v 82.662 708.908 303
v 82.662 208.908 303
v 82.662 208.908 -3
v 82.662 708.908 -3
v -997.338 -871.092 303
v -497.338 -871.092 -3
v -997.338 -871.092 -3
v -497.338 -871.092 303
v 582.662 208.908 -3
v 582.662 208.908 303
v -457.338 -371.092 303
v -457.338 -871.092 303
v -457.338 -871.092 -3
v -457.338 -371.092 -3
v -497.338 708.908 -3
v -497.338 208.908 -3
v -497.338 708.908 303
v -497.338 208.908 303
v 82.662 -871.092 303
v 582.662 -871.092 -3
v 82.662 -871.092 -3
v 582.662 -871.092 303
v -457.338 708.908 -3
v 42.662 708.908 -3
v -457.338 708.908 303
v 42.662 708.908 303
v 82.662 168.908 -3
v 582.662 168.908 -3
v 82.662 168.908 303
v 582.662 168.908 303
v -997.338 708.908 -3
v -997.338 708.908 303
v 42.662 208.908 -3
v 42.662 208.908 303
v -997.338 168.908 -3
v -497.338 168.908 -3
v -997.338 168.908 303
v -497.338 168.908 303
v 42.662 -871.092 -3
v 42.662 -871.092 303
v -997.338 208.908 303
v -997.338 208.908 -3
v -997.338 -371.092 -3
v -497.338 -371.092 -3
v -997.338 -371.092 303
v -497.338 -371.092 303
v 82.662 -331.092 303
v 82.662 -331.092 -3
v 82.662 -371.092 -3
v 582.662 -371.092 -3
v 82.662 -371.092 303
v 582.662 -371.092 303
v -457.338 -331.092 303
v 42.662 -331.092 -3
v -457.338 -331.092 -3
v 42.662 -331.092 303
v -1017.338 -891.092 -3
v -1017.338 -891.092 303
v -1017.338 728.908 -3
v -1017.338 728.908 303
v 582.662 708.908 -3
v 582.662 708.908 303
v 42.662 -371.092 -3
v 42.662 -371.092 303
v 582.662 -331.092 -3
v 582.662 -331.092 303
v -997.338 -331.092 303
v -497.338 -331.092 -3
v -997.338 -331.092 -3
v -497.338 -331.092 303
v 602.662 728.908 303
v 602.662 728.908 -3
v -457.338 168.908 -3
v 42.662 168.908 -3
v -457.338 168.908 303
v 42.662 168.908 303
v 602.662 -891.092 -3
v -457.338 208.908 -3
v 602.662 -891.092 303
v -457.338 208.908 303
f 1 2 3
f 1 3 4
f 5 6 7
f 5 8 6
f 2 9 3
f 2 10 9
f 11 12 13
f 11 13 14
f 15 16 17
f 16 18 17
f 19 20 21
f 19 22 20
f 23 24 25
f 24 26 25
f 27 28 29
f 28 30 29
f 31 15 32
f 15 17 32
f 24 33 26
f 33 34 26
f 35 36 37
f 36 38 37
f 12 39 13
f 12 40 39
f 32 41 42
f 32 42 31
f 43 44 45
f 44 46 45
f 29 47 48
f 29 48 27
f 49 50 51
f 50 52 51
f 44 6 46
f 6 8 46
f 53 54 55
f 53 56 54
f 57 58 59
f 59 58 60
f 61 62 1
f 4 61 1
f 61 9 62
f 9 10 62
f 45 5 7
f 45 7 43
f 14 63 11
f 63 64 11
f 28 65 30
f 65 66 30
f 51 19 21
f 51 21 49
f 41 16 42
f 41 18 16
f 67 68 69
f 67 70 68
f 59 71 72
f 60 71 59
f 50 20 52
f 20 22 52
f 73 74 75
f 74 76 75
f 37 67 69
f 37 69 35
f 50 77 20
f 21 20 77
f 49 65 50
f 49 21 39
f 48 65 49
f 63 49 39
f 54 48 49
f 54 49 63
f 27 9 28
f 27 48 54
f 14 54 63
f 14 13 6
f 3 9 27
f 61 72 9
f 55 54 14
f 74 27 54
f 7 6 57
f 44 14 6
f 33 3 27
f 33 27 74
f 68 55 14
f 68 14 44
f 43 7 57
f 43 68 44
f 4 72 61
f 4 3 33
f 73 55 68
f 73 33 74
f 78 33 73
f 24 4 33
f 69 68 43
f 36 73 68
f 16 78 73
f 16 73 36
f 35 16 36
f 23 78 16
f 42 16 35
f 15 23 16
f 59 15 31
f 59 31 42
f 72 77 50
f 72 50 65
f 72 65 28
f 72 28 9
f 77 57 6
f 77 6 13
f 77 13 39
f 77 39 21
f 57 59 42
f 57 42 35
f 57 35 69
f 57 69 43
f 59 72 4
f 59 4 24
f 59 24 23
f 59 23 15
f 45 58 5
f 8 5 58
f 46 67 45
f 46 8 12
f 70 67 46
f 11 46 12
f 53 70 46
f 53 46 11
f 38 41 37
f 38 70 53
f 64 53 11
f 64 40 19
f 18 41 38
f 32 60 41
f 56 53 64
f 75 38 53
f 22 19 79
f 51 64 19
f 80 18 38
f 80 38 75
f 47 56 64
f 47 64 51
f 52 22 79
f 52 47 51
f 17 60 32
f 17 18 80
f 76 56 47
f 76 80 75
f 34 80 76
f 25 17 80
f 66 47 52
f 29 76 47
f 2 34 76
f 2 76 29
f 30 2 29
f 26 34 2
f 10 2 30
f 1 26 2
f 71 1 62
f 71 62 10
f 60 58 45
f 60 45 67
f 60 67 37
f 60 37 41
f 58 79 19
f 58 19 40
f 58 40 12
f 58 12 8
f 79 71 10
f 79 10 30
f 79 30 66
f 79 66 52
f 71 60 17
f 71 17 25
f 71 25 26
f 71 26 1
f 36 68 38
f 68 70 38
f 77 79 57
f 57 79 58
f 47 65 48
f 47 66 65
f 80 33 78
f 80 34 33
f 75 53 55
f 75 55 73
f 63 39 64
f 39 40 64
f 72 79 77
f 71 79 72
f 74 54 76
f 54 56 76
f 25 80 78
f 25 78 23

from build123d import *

# Parameters (mm, degrees)
SKETCH1_W           = 1620
SKETCH1_H           = 1620
SKETCH1_W_2         = 500
SKETCH1_H_2         = 500
BOSS_EXTRUDE1_DEPTH = 300
SKETCH2_W           = 1620
SKETCH2_H           = 1620
SKETCH2_W_2         = 500
SKETCH2_H_2         = 500
BOSS_EXTRUDE2_DEPTH = 3
SKETCH3_W           = 1620
SKETCH3_H           = 1620
SKETCH3_W_2         = 500
SKETCH3_H_2         = 500
BOSS_EXTRUDE3_DEPTH = 3


with BuildPart() as part:
    # Sketch1 → Boss-Extrude1 (new body)
    with BuildSketch(Plane.XY):
        with Locations((-207.337883959, -81.092150171)):
            Rectangle(SKETCH1_W, SKETCH1_H)
        with Locations((-747.337883959, -621.092150171)):
            Rectangle(SKETCH1_W_2, SKETCH1_H_2, mode=Mode.SUBTRACT)
        with Locations((-207.337883959, -621.092150171)):
            Rectangle(SKETCH1_W_2, SKETCH1_H_2, mode=Mode.SUBTRACT)
        with Locations((-747.337883959, -81.092150171)):
            Rectangle(SKETCH1_W_2, SKETCH1_H_2, mode=Mode.SUBTRACT)
        with Locations((332.662116041, -81.092150171)):
            Rectangle(SKETCH1_W_2, SKETCH1_H_2, mode=Mode.SUBTRACT)
        with Locations((-747.337883959, 458.907849829)):
            Rectangle(SKETCH1_W_2, SKETCH1_H_2, mode=Mode.SUBTRACT)
        with Locations((-207.337883959, 458.907849829)):
            Rectangle(SKETCH1_W_2, SKETCH1_H_2, mode=Mode.SUBTRACT)
        with Locations((332.662116041, 458.907849829)):
            Rectangle(SKETCH1_W_2, SKETCH1_H_2, mode=Mode.SUBTRACT)
        with Locations((-207.337883959, -81.092150171)):
            Rectangle(SKETCH1_W_2, SKETCH1_H_2, mode=Mode.SUBTRACT)
        with Locations((332.662116041, -621.092150171)):
            Rectangle(SKETCH1_W_2, SKETCH1_H_2, mode=Mode.SUBTRACT)
    extrude(amount=BOSS_EXTRUDE1_DEPTH)

    # Sketch2 → Boss-Extrude2 (add)
    with BuildSketch(Plane.XY.offset(300)):
        with Locations((-207.337883959, -81.092150171)):
            Rectangle(SKETCH2_W, SKETCH2_H)
        with Locations((332.662116041, 458.907849829)):
            Rectangle(SKETCH2_W_2, SKETCH2_H_2, mode=Mode.SUBTRACT)
        with Locations((-747.337883959, 458.907849829)):
            Rectangle(SKETCH2_W_2, SKETCH2_H_2, mode=Mode.SUBTRACT)
        with Locations((-207.337883959, 458.907849829)):
            Rectangle(SKETCH2_W_2, SKETCH2_H_2, mode=Mode.SUBTRACT)
        with Locations((-747.337883959, -81.092150171)):
            Rectangle(SKETCH2_W_2, SKETCH2_H_2, mode=Mode.SUBTRACT)
        with Locations((-207.337883959, -81.092150171)):
            Rectangle(SKETCH2_W_2, SKETCH2_H_2, mode=Mode.SUBTRACT)
        with Locations((332.662116041, -81.092150171)):
            Rectangle(SKETCH2_W_2, SKETCH2_H_2, mode=Mode.SUBTRACT)
        with Locations((-747.337883959, -621.092150171)):
            Rectangle(SKETCH2_W_2, SKETCH2_H_2, mode=Mode.SUBTRACT)
        with Locations((-207.337883959, -621.092150171)):
            Rectangle(SKETCH2_W_2, SKETCH2_H_2, mode=Mode.SUBTRACT)
        with Locations((332.662116041, -621.092150171)):
            Rectangle(SKETCH2_W_2, SKETCH2_H_2, mode=Mode.SUBTRACT)
    extrude(amount=BOSS_EXTRUDE2_DEPTH)

    # Sketch3 → Boss-Extrude3 (add)
    with BuildSketch(Plane(origin=(0, 0, 0), x_dir=(-1, 0, 0), z_dir=(0, 0, -1))):
        with Locations((207.337883959, -81.092150171)):
            Rectangle(SKETCH3_W, SKETCH3_H)
        with Locations((747.337883959, -621.092150171)):
            Rectangle(SKETCH3_W_2, SKETCH3_H_2, mode=Mode.SUBTRACT)
        with Locations((207.337883959, -621.092150171)):
            Rectangle(SKETCH3_W_2, SKETCH3_H_2, mode=Mode.SUBTRACT)
        with Locations((-332.662116041, -621.092150171)):
            Rectangle(SKETCH3_W_2, SKETCH3_H_2, mode=Mode.SUBTRACT)
        with Locations((207.337883959, -81.092150171)):
            Rectangle(SKETCH3_W_2, SKETCH3_H_2, mode=Mode.SUBTRACT)
        with Locations((-332.662116041, -81.092150171)):
            Rectangle(SKETCH3_W_2, SKETCH3_H_2, mode=Mode.SUBTRACT)
        with Locations((207.337883959, 458.907849829)):
            Rectangle(SKETCH3_W_2, SKETCH3_H_2, mode=Mode.SUBTRACT)
        with Locations((747.337883959, -81.092150171)):
            Rectangle(SKETCH3_W_2, SKETCH3_H_2, mode=Mode.SUBTRACT)
        with Locations((747.337883959, 458.907849829)):
            Rectangle(SKETCH3_W_2, SKETCH3_H_2, mode=Mode.SUBTRACT)
        with Locations((-332.662116041, 458.907849829)):
            Rectangle(SKETCH3_W_2, SKETCH3_H_2, mode=Mode.SUBTRACT)
    extrude(amount=BOSS_EXTRUDE3_DEPTH)


solid = part.part
